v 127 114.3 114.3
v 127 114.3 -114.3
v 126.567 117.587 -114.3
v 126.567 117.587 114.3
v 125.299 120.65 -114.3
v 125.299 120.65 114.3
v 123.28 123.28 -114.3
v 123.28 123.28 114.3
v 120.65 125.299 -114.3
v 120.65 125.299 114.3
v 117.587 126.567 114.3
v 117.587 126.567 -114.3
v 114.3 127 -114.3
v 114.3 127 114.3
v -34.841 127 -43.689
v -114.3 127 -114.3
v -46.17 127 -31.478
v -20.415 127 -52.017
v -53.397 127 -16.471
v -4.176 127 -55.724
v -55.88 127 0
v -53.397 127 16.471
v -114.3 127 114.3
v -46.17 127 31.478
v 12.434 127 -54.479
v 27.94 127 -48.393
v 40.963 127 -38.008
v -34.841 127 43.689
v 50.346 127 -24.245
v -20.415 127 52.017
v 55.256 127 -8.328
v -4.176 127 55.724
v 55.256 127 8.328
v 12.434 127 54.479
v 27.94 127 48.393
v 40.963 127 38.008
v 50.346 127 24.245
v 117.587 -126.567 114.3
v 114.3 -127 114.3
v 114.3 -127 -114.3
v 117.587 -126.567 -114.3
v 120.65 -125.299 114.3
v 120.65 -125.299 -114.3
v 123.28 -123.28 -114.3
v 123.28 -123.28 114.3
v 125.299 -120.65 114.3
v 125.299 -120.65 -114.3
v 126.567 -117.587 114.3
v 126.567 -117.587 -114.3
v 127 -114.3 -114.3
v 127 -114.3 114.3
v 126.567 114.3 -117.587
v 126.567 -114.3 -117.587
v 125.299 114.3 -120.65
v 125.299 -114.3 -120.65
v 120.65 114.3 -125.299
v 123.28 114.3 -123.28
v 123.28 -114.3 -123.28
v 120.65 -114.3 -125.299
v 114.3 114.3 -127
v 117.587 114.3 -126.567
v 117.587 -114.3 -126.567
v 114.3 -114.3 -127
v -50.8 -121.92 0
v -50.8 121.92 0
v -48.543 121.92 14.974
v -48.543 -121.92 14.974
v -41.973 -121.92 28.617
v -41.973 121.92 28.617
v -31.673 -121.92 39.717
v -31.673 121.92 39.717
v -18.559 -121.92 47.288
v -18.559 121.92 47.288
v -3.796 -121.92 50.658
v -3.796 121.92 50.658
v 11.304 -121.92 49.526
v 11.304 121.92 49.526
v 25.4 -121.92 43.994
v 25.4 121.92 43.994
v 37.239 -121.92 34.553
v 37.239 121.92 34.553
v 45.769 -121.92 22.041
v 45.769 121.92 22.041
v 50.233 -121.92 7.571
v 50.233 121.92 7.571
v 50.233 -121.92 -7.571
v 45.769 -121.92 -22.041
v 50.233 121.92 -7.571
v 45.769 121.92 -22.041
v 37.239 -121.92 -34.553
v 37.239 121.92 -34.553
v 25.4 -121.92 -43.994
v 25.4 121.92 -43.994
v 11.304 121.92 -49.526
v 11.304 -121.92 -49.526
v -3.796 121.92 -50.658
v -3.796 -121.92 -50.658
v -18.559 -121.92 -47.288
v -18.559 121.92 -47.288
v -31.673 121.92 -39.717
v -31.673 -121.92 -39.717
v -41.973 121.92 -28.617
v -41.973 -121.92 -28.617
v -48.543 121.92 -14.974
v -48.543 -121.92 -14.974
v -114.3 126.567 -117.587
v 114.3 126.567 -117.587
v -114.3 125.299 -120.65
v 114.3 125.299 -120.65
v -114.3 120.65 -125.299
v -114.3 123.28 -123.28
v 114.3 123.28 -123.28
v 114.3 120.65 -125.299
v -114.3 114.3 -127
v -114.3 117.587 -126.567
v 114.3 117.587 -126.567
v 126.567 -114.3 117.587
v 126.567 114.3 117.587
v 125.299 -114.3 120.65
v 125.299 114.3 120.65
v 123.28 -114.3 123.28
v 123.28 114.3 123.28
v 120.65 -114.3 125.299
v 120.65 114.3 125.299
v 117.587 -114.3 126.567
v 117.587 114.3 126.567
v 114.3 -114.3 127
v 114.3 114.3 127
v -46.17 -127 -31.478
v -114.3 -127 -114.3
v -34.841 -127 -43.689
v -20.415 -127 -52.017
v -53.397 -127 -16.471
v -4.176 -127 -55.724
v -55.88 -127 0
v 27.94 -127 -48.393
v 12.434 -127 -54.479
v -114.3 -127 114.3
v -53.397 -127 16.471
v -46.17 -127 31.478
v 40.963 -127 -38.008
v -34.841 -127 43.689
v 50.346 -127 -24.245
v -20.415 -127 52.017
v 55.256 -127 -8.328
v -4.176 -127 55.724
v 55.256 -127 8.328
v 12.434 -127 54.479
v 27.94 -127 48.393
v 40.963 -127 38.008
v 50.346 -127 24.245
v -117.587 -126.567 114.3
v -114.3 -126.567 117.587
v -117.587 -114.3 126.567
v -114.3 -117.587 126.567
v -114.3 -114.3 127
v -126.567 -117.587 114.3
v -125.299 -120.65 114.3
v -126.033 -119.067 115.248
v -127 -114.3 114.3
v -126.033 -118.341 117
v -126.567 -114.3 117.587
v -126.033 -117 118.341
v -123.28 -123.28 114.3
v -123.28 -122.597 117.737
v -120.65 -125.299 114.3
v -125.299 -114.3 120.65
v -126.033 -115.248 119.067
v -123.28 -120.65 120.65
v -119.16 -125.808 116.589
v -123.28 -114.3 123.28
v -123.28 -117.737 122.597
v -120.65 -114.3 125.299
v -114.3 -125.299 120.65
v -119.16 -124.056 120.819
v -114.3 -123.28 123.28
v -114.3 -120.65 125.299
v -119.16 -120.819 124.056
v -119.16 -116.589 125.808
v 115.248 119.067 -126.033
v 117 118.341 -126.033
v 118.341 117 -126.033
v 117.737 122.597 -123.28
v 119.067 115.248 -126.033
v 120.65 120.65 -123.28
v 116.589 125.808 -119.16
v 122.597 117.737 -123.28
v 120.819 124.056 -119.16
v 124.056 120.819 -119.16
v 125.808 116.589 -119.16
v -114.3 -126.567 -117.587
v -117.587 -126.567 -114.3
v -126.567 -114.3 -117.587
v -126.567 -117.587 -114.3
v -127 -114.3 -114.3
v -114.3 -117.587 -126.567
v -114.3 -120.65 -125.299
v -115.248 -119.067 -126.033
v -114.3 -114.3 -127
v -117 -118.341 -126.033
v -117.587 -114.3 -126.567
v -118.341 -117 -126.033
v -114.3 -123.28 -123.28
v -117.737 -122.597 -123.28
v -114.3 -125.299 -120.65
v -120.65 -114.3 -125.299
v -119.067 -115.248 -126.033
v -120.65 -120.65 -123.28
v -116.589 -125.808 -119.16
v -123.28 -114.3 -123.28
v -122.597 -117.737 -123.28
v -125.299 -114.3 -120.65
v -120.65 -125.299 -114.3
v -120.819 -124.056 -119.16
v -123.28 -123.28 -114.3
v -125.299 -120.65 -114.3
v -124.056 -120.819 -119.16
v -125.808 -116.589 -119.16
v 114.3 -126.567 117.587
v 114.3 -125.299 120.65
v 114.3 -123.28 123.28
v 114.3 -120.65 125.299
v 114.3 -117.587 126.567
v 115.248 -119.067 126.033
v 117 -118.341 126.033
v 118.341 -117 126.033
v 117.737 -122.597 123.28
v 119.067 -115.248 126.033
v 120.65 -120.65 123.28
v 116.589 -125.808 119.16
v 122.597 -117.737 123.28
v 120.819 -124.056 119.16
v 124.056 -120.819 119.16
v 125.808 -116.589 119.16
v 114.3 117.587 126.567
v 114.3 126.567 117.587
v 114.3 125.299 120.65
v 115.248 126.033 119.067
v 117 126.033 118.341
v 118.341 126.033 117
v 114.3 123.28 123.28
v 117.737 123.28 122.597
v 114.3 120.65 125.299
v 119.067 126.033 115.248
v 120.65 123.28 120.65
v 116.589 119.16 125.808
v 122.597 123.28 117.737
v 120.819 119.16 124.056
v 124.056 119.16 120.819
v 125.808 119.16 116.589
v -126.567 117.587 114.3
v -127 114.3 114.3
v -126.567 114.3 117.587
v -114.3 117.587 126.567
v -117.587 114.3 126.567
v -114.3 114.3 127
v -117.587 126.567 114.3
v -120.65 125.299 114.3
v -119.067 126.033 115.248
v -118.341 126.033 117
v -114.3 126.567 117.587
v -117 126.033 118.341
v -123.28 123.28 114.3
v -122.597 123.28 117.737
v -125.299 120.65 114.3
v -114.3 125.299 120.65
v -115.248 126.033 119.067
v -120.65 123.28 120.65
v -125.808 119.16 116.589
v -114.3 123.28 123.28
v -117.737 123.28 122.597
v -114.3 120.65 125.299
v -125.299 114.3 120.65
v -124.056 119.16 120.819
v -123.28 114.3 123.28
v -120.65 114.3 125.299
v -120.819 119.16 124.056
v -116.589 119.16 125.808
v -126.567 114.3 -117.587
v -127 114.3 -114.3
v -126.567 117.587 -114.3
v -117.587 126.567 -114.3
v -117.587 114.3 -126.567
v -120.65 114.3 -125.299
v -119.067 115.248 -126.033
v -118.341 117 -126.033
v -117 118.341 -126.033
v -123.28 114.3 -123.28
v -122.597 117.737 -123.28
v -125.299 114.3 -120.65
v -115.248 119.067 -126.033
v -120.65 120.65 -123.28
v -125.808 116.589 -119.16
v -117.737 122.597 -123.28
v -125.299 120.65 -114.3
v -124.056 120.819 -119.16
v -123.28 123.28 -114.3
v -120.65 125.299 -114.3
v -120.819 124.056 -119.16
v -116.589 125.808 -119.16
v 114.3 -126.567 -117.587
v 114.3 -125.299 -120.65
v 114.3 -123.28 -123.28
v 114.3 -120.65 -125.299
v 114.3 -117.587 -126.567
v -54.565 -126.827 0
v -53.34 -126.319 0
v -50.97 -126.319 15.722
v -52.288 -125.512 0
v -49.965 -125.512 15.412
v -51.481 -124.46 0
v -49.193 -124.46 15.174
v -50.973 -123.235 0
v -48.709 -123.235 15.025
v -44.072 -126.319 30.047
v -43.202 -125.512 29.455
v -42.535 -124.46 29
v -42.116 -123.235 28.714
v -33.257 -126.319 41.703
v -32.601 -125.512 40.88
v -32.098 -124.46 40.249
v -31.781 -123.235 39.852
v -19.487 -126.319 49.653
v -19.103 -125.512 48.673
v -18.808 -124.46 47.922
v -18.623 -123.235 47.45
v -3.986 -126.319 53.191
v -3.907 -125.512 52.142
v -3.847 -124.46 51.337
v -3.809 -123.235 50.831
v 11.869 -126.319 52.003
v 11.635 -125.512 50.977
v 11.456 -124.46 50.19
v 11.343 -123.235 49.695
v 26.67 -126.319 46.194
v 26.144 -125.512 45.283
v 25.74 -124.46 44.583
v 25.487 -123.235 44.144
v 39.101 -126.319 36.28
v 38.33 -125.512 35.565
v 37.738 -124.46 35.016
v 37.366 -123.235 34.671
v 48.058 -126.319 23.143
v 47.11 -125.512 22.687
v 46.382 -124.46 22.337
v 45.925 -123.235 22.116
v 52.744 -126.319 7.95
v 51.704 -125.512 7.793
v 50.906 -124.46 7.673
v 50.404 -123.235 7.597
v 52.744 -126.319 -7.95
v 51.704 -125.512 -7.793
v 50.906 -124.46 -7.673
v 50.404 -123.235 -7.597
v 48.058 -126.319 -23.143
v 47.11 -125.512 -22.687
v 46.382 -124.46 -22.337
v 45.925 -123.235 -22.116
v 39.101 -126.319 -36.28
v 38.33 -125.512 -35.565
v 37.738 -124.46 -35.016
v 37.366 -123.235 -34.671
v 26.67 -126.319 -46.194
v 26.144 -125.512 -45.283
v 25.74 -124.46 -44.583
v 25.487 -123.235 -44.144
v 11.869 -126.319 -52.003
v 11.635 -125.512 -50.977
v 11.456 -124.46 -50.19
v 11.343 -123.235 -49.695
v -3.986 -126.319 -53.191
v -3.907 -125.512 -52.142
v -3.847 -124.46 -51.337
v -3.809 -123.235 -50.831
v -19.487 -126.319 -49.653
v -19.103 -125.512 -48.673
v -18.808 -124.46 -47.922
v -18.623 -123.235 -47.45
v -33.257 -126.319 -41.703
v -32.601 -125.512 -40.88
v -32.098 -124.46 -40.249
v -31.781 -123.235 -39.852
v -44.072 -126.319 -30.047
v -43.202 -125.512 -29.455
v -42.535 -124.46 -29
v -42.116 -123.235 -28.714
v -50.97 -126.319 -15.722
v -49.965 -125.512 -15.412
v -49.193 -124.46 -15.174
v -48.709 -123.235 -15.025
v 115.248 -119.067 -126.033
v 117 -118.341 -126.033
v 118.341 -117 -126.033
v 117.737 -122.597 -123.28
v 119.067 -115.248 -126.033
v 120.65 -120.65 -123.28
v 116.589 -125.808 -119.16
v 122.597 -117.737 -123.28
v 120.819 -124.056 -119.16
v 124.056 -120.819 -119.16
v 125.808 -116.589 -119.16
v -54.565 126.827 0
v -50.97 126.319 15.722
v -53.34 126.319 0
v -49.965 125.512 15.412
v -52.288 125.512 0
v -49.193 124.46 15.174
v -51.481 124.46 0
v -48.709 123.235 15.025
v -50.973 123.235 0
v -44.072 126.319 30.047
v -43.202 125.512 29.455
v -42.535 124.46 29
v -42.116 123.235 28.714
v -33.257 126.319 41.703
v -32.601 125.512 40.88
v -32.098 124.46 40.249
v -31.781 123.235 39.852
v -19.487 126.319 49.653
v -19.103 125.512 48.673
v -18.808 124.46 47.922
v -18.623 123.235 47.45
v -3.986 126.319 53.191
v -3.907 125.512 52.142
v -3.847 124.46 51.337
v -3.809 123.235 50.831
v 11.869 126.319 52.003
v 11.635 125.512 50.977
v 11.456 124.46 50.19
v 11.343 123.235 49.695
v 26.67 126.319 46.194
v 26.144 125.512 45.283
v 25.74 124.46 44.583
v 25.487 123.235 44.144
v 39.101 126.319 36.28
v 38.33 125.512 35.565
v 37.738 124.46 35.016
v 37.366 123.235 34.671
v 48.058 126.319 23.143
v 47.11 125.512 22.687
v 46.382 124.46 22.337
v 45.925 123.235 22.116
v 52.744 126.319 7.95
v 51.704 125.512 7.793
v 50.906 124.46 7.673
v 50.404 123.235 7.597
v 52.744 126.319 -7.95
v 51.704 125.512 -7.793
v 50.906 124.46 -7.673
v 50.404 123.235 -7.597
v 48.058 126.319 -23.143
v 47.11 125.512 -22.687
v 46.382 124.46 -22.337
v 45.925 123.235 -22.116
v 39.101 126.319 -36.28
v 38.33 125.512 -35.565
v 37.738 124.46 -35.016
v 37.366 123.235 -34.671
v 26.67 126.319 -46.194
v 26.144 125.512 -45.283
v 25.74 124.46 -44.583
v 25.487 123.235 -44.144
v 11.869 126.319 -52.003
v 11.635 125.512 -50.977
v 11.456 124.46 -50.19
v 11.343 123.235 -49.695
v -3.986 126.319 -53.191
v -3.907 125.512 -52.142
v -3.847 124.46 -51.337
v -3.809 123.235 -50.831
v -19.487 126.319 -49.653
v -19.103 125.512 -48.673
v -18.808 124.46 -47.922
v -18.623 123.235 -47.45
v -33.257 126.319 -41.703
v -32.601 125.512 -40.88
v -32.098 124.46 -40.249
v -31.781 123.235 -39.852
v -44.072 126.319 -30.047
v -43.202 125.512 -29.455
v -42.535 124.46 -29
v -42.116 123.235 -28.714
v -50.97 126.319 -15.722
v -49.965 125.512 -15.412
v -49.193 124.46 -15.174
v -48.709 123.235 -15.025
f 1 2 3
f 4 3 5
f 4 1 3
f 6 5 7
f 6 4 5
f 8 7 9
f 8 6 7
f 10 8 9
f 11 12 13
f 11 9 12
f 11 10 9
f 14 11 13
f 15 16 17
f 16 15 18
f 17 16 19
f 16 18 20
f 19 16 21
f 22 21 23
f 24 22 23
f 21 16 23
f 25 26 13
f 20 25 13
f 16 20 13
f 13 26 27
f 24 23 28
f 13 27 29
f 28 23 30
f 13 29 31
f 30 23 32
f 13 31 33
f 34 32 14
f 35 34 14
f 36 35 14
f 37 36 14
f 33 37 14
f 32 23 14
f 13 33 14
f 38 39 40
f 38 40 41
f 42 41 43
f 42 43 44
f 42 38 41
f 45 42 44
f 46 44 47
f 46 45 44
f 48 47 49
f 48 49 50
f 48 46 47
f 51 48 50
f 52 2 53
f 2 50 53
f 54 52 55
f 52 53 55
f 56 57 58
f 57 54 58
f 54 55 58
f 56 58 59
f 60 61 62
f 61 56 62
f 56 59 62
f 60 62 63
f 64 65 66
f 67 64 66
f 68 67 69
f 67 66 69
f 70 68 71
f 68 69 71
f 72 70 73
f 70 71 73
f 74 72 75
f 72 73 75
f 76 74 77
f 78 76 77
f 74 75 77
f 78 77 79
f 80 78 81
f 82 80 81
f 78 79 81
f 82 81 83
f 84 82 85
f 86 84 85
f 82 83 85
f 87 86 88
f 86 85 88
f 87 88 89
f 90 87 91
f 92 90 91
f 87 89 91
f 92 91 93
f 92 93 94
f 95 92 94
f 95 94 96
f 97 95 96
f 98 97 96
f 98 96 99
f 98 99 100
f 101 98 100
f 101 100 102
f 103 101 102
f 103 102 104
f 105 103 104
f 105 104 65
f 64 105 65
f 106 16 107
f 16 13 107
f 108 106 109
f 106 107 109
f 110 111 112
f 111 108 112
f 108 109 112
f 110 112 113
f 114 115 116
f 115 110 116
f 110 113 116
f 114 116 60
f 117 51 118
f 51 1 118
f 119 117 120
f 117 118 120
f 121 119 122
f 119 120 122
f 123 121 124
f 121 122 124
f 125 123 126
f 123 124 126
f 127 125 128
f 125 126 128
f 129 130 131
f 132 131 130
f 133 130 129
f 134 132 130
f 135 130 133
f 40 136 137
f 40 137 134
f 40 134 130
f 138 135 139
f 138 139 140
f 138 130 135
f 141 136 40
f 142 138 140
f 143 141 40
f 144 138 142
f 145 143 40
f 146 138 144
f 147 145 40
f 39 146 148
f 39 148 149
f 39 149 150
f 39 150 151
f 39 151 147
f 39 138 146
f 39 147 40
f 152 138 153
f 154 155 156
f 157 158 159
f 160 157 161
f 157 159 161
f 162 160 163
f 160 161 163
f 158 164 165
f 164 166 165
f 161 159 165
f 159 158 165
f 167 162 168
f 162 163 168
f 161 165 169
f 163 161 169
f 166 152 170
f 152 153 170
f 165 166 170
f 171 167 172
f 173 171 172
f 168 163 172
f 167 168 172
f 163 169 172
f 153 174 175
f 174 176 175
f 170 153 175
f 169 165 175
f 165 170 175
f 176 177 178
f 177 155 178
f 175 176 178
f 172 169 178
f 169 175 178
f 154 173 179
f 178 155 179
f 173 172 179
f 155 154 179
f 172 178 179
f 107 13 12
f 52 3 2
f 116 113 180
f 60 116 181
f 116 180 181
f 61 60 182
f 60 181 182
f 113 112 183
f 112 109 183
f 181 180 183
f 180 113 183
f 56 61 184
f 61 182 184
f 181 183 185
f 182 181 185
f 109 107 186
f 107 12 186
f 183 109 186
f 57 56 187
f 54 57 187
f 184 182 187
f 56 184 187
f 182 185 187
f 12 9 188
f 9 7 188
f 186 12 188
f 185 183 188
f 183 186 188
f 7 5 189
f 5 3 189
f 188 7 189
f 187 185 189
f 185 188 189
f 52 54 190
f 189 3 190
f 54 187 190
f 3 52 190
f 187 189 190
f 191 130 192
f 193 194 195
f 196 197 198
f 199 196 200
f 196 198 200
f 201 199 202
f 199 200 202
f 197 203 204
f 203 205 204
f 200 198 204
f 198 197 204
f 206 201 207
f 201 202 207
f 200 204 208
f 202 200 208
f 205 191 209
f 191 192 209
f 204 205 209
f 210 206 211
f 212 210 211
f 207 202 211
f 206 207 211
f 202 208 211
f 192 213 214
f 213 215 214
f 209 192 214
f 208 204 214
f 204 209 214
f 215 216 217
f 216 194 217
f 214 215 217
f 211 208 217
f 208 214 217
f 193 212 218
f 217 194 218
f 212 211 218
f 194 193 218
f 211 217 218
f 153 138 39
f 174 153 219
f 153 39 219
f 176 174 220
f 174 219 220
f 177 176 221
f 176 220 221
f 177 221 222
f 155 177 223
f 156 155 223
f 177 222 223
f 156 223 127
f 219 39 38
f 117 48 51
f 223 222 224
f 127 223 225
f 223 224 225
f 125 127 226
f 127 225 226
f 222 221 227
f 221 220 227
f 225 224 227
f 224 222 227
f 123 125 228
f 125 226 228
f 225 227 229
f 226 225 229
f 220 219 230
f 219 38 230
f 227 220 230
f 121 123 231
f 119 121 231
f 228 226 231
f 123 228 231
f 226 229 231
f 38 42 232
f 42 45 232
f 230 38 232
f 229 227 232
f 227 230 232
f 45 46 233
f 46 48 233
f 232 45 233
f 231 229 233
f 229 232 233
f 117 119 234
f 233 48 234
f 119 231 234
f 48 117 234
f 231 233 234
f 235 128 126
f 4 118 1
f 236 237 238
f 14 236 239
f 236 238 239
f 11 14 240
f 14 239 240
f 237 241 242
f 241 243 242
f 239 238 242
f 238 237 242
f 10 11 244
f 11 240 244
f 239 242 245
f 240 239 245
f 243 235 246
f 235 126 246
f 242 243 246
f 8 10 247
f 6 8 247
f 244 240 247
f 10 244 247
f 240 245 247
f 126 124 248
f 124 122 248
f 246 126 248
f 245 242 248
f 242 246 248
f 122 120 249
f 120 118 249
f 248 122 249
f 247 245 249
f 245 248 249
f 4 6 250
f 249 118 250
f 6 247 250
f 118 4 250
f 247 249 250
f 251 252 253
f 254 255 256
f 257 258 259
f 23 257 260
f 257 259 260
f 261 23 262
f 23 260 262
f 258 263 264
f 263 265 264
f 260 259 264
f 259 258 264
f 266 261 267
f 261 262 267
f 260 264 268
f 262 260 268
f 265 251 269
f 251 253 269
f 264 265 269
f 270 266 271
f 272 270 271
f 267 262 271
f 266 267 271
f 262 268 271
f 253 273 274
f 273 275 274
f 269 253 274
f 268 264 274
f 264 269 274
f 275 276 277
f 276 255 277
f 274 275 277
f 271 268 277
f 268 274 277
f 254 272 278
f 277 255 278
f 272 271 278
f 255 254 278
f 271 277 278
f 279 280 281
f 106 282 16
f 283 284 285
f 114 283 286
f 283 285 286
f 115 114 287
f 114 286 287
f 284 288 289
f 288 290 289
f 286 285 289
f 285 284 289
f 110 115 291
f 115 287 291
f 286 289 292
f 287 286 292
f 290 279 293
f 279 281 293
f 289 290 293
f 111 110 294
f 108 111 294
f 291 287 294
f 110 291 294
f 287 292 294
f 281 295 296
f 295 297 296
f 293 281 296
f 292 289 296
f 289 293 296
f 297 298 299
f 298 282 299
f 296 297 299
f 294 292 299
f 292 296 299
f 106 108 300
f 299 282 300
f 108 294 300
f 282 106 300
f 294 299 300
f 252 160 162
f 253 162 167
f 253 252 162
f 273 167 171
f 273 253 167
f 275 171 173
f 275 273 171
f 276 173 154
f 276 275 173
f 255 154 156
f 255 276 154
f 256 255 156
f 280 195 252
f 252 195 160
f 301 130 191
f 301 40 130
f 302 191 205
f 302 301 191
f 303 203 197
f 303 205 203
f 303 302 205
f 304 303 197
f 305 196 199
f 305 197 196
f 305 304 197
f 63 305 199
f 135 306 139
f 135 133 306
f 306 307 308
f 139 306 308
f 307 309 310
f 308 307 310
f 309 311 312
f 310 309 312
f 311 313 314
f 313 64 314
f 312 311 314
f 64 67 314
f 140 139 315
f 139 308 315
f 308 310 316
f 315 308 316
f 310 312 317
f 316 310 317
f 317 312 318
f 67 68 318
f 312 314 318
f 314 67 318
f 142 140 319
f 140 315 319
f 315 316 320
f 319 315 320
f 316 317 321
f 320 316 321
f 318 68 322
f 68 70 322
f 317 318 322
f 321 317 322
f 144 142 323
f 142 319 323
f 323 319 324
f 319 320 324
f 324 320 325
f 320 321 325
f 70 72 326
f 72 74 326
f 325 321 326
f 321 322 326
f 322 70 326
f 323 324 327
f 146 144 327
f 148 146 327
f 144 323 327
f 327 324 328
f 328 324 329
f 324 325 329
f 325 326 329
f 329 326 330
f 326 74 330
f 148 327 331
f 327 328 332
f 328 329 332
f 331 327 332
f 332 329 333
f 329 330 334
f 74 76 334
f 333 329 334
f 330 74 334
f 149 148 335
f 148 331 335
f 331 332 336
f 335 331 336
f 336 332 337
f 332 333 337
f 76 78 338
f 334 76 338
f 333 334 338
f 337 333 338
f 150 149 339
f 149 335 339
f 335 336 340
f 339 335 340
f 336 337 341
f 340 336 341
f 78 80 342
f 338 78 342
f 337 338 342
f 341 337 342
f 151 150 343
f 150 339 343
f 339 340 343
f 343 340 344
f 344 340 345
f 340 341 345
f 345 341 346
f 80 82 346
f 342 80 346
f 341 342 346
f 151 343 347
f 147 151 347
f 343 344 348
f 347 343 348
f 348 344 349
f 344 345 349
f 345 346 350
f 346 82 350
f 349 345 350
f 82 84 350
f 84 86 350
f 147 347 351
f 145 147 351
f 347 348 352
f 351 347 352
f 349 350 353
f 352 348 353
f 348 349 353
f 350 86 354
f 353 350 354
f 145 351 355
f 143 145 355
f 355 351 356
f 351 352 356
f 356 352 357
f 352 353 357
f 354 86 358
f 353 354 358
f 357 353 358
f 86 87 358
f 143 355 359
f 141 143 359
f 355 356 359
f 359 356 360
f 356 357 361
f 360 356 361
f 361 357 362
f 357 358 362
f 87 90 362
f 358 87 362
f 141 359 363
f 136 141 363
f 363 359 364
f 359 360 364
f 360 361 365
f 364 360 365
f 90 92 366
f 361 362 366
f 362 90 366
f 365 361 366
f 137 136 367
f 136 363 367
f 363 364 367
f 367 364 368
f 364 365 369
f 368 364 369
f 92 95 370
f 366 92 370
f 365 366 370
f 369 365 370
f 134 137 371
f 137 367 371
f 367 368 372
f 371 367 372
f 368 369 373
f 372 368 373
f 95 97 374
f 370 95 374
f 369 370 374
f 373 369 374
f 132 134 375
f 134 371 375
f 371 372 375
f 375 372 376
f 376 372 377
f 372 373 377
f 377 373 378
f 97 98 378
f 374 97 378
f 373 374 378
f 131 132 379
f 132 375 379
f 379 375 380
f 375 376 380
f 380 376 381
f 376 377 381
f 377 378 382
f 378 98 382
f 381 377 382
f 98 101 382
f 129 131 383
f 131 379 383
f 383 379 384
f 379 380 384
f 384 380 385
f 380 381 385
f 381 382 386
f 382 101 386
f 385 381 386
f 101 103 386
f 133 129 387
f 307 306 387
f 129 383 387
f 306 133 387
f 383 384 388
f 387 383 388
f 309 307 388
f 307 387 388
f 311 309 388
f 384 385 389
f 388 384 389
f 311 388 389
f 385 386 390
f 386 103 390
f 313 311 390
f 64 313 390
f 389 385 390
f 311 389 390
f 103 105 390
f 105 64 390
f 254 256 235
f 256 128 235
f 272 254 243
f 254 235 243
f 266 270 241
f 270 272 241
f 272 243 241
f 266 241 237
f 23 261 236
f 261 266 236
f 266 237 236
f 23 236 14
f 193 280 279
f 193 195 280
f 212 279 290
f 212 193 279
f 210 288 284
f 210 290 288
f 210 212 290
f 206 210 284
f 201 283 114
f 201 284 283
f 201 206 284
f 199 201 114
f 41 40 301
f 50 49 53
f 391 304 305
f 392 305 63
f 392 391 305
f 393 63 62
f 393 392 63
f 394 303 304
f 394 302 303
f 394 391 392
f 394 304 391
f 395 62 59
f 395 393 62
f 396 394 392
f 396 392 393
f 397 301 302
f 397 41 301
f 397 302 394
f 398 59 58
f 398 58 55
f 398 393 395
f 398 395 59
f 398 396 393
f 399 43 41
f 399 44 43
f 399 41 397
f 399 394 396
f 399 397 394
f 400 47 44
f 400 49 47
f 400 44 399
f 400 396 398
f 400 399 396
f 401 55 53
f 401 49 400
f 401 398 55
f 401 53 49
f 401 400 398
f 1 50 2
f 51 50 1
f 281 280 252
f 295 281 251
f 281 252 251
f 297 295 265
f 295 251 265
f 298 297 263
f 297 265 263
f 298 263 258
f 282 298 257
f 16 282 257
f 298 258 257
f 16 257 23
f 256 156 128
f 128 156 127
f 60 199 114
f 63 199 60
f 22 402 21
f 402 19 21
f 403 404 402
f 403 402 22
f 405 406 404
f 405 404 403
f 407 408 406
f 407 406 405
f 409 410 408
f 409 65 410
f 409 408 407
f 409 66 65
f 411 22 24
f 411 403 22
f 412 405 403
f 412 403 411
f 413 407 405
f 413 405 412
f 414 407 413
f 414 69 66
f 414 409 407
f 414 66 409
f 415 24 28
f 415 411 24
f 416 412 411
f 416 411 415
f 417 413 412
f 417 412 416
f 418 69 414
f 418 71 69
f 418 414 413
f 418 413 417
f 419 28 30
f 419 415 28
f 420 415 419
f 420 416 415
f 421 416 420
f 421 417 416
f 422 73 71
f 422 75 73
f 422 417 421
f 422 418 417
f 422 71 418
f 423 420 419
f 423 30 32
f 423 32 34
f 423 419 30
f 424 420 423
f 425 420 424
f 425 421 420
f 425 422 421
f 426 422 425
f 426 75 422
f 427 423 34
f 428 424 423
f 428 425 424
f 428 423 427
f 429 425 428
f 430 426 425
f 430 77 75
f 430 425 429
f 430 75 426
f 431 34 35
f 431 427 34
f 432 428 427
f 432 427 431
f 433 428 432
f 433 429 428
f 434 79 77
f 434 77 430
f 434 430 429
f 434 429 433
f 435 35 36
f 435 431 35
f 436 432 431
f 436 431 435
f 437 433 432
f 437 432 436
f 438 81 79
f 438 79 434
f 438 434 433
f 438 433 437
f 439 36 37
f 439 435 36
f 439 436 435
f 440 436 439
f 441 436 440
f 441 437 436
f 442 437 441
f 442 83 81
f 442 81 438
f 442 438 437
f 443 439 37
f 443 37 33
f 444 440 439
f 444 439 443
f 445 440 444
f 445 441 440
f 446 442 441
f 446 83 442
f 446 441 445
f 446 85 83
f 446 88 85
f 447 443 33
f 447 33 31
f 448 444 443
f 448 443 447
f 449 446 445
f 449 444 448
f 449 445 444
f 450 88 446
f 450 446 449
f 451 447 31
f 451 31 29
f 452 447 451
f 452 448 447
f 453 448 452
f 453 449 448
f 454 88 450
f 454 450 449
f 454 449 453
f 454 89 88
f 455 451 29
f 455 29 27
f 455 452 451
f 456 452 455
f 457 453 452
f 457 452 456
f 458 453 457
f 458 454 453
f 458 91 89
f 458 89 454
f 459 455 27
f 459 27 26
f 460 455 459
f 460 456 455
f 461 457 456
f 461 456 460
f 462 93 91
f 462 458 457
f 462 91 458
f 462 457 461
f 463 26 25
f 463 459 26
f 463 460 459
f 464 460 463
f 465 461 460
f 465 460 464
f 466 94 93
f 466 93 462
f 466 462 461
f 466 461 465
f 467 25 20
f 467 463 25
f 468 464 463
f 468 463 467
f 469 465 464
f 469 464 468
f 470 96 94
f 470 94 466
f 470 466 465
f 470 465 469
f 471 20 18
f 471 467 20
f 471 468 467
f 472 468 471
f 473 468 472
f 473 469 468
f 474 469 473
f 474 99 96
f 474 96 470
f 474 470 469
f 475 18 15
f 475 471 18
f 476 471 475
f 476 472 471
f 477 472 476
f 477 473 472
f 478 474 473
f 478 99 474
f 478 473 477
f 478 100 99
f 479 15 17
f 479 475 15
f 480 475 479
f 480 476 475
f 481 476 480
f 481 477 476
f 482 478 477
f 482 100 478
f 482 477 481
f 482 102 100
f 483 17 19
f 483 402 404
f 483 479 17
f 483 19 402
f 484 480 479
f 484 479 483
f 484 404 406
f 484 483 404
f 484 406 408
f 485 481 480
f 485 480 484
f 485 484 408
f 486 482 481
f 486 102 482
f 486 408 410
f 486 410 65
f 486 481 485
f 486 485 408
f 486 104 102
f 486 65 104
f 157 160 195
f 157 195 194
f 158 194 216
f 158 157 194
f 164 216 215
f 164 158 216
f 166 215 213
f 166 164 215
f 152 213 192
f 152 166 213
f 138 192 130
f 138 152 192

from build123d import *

# Parameters (mm, degrees)
F0_W     = 254
F0_H     = 254
F1_DEPTH = 127
F2_R     = 12.7
F3_R     = 50.8
F4_DEPTH = 254.001
F5_R     = 5.08


with BuildPart() as f1:
    # F0 (on Front) → F1 (new body, symmetric)
    with BuildSketch(Plane.XZ):
        Rectangle(F0_W, F0_H)
    extrude(amount=F1_DEPTH, both=True)

    # F2
    f2_edges = [f1.edges().sort_by_distance(p)[0] for p in [
        (127, -127, 0),
        (0, -127, 127),
        (-127, -127, 0),
        (0, -127, -127),
        (-127, 0, 127),
        (-127, 127, 0),
        (-127, 0, -127),
        (127, 0, 127),
        (0, 127, 127),
        (127, 127, 0),
        (0, 127, -127),
        (127, 0, -127),
    ]]
    fillet(f2_edges, radius=F2_R)

    # F3 (on face) → F4 (cut, through all)
    with BuildSketch(Plane(origin=(0, 127, 0), x_dir=(-1, 0, 0), z_dir=(0, 1, 0))):
        Circle(F3_R)
    extrude(amount=-F4_DEPTH, mode=Mode.SUBTRACT)

    # F5
    f5_edges = [f1.edges().sort_by_distance(p)[0] for p in [
        (50.8, 127, 0),
        (50.8, -127, 0),
    ]]
    fillet(f5_edges, radius=F5_R)


solid = f1.part
